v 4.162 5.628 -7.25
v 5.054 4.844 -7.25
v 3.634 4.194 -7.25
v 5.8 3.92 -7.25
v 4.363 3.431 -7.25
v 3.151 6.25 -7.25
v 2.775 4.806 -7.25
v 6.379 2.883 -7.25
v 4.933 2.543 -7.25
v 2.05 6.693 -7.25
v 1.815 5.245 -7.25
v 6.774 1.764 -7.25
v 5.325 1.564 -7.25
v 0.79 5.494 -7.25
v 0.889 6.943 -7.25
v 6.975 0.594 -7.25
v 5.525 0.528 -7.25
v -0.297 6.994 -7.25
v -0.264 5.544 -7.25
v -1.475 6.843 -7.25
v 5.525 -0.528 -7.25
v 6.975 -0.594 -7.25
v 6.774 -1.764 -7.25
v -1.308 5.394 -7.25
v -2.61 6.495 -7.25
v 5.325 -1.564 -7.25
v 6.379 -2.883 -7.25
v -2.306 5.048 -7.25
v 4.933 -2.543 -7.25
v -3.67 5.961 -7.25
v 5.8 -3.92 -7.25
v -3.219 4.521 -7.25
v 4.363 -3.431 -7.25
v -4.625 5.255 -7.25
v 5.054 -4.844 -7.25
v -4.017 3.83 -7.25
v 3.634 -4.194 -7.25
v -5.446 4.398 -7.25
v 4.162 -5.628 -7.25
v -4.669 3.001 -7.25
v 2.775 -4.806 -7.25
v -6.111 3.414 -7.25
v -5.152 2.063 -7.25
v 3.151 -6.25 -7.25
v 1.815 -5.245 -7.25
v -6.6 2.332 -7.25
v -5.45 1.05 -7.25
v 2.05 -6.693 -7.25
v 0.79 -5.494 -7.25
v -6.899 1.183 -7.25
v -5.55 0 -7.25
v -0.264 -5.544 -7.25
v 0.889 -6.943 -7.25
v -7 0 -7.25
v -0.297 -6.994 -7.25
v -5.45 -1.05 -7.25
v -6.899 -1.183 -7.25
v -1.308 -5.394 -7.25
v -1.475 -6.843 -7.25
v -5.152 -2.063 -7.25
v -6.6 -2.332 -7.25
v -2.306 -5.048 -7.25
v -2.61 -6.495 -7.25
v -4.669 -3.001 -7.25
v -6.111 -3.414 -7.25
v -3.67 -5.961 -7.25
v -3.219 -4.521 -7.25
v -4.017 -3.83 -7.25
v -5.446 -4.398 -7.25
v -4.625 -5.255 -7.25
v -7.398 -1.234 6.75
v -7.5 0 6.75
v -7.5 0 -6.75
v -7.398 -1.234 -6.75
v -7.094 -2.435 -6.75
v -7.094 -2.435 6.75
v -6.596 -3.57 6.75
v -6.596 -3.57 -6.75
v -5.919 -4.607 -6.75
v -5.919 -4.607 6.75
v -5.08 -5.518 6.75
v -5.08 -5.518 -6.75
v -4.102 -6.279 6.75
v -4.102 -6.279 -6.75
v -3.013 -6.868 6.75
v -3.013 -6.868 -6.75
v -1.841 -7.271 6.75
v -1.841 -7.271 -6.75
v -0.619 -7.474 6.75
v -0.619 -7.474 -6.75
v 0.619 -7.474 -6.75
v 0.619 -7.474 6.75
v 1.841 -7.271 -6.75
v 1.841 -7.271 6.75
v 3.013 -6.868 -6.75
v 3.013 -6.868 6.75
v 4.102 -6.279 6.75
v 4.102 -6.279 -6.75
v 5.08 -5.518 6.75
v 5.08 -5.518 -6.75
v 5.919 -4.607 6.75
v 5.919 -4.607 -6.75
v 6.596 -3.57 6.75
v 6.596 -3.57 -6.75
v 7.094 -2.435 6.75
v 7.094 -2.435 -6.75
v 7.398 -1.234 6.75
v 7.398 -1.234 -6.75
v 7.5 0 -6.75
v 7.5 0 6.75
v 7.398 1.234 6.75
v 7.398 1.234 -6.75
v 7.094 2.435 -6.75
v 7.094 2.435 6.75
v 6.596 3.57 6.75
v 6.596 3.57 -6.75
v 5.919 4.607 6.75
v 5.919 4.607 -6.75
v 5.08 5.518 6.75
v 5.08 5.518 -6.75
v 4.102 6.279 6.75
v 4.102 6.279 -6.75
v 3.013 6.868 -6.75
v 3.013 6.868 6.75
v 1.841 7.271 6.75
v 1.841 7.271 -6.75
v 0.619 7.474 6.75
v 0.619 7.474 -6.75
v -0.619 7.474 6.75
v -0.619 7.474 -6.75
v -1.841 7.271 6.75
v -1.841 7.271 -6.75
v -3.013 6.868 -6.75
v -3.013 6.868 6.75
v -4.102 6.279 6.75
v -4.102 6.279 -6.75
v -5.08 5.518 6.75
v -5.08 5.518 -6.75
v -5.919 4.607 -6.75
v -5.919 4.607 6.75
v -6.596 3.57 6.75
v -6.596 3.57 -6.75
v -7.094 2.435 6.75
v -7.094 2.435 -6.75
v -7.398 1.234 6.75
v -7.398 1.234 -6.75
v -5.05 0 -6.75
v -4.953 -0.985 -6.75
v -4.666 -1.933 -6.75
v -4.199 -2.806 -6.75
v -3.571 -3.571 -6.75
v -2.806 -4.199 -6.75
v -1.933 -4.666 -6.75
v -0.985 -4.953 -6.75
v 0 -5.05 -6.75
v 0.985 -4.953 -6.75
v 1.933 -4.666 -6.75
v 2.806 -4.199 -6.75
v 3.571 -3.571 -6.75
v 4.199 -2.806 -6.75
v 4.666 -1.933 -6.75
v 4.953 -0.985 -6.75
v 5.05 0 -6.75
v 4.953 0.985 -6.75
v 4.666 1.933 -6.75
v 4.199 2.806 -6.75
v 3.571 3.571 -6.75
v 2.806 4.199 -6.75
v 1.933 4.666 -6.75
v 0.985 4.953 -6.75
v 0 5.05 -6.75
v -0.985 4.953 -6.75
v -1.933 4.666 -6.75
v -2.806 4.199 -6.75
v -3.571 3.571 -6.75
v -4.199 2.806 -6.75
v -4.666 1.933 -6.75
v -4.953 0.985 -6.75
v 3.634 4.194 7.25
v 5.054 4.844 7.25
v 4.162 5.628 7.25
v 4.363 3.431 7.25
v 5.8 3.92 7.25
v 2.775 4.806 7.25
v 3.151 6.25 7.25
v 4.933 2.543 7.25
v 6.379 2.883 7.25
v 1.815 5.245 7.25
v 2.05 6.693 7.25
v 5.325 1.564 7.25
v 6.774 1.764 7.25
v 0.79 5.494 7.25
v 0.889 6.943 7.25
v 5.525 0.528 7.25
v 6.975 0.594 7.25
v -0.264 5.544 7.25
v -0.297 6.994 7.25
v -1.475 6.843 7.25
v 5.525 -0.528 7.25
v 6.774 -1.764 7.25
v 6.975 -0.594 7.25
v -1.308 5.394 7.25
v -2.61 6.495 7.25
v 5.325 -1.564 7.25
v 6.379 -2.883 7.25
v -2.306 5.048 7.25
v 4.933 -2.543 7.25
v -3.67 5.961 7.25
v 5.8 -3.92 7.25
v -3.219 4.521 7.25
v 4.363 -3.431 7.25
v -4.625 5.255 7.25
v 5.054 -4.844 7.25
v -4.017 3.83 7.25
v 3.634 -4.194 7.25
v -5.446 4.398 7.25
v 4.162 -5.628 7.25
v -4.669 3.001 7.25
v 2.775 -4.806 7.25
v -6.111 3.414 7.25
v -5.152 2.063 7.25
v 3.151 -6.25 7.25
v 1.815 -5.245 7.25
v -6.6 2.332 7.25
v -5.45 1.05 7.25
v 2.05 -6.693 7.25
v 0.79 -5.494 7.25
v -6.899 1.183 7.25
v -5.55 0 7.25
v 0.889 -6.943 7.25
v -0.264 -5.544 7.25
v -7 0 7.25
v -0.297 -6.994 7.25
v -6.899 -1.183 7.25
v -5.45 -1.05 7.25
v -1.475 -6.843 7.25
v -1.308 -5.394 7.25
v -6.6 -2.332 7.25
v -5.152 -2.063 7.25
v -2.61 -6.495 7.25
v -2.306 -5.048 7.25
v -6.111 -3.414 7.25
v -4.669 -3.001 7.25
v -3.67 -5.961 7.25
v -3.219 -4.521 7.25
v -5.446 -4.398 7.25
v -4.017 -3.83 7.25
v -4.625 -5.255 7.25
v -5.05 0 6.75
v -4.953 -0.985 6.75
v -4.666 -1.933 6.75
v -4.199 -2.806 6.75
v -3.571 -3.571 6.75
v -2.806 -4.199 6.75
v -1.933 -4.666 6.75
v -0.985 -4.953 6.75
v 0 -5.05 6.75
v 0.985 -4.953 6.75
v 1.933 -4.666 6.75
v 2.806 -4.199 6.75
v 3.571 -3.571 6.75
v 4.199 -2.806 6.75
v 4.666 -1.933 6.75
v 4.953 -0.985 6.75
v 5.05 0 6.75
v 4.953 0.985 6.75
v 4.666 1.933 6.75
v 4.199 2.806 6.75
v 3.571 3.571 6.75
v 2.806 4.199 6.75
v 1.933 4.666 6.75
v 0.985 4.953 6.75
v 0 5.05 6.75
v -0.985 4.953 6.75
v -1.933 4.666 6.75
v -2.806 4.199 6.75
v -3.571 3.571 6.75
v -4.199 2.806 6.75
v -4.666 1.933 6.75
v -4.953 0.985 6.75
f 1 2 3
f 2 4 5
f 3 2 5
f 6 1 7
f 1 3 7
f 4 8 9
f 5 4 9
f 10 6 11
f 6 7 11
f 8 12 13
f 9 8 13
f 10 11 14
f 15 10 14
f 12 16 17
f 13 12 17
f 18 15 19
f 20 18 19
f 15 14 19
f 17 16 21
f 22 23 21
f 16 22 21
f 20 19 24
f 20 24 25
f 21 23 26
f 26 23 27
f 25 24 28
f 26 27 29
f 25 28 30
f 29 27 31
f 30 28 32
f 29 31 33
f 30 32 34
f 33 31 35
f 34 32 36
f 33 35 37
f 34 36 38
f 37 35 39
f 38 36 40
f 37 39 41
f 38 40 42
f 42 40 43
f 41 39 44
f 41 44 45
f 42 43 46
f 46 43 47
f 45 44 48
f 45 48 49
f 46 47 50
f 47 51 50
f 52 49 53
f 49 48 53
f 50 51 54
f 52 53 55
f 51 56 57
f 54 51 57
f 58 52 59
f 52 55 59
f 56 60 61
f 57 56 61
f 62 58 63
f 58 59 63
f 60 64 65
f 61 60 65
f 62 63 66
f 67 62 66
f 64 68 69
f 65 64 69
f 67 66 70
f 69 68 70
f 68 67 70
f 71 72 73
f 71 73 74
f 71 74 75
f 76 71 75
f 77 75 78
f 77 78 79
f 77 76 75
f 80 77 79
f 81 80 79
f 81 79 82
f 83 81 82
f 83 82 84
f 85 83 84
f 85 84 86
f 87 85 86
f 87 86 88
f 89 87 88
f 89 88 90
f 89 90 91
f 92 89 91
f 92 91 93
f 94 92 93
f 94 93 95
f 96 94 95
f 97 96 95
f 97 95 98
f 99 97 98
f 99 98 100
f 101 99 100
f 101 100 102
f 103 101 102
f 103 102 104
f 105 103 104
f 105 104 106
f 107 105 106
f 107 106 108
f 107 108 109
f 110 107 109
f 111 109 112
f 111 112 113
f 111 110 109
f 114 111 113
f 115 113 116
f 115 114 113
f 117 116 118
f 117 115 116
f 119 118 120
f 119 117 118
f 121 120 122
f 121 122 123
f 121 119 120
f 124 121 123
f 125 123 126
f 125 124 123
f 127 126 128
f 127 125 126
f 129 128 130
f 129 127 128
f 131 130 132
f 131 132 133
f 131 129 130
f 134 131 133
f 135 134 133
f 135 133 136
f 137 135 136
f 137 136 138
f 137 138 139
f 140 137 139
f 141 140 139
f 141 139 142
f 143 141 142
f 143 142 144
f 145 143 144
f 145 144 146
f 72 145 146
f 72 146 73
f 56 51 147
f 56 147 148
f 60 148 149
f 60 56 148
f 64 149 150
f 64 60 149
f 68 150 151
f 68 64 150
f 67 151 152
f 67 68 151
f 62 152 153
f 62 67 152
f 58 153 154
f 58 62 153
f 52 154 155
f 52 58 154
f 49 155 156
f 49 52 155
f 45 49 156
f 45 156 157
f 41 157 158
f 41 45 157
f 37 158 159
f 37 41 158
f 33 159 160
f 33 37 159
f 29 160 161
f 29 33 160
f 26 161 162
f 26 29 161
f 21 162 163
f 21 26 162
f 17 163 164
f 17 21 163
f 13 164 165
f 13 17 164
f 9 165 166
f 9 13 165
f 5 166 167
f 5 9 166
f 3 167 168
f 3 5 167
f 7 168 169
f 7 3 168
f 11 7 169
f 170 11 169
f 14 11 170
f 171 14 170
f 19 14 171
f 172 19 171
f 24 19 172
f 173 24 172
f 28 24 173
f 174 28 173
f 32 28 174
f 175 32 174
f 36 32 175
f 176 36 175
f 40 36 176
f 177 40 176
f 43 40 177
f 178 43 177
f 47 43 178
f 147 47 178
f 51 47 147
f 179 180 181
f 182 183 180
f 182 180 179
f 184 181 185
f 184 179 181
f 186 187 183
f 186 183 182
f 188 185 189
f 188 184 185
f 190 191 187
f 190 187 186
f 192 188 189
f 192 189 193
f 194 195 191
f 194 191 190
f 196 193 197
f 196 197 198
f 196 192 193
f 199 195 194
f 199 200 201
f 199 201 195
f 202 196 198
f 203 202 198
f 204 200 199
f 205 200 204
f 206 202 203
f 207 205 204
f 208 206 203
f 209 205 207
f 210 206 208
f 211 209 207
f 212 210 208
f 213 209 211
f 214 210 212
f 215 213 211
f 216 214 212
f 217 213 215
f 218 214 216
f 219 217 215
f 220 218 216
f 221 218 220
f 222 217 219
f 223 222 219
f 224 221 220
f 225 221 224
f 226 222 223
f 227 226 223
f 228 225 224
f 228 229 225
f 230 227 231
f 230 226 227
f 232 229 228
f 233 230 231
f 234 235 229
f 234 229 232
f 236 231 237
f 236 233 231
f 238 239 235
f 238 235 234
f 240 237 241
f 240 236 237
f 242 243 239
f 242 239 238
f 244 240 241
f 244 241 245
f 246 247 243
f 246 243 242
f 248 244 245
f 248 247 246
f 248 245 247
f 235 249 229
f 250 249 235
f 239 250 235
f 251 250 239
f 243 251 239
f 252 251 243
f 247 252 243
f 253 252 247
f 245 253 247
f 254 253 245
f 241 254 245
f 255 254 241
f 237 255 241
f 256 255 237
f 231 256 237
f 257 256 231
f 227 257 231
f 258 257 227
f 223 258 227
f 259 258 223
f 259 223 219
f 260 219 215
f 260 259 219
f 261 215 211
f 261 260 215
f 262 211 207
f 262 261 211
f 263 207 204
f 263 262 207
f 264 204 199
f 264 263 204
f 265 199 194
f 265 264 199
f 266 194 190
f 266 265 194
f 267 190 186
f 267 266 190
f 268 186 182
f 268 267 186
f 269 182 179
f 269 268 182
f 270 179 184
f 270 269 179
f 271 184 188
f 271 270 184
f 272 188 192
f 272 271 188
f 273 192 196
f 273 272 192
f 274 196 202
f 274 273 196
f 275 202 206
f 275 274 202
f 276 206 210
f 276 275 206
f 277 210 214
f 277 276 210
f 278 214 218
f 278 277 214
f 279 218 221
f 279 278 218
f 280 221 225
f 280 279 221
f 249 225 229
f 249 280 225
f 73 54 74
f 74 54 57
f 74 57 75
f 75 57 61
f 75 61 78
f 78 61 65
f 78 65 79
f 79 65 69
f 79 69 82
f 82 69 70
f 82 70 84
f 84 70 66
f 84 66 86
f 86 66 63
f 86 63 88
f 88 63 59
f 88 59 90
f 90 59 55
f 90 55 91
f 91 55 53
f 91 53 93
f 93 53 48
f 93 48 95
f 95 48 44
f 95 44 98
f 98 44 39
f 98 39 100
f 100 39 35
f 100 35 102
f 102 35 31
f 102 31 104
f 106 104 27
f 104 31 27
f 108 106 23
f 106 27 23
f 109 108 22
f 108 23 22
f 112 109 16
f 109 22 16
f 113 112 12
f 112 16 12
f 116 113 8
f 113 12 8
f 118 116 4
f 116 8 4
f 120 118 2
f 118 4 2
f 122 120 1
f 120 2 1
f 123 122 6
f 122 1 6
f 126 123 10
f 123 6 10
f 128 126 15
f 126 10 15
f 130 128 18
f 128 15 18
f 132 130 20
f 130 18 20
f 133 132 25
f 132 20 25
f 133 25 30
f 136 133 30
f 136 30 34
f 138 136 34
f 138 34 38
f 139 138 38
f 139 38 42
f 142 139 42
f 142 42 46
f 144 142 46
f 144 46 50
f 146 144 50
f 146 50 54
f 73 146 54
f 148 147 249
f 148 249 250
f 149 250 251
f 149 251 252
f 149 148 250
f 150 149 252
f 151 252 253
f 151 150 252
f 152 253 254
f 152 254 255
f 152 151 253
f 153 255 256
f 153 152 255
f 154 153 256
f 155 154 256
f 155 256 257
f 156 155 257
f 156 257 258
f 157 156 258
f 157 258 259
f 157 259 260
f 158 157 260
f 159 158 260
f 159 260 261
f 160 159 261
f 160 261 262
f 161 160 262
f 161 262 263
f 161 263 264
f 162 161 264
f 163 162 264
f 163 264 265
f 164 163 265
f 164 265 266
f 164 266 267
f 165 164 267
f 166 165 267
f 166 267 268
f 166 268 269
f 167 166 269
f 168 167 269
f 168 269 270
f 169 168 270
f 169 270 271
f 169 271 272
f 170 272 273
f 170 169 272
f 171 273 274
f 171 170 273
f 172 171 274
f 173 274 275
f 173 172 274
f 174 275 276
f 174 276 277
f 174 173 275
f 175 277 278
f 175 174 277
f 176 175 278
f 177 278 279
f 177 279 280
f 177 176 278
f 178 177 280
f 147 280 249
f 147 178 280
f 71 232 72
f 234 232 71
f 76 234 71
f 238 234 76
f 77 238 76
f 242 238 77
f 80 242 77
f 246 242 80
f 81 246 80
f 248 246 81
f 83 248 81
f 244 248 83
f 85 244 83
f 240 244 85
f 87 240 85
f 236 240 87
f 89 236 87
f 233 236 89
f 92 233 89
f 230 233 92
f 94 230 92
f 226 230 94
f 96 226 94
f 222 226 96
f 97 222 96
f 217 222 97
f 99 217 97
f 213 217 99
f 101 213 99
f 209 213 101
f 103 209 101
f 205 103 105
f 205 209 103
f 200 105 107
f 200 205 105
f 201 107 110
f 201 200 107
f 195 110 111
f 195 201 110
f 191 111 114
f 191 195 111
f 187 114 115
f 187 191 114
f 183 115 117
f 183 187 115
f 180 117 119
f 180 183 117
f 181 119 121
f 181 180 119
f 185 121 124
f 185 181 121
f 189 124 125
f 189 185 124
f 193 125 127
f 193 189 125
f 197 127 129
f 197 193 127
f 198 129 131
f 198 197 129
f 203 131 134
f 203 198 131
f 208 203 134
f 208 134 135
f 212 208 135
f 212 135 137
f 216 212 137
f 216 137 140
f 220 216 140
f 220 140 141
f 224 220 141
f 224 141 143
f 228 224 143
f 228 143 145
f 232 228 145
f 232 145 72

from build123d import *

# Parameters (mm, degrees)
ESBO_O1_R                = 7.5
ESBO_O1_R_2              = 5.05
RESSALTO_EXTRUS_O1_DEPTH = 7.25
CHANFRO1_SIZE            = 0.5


with BuildPart() as part:
    # Esboço1 → Ressalto-extrusão1 (new, symmetric)
    with BuildSketch(Plane.XY):
        with Locations(Location((0, 0, 0), (0, 0, 180))):
            Circle(ESBO_O1_R)
        with Locations(Location((0, 0, 0), (0, 0, 180))):
            Circle(ESBO_O1_R_2, mode=Mode.SUBTRACT)
    extrude(amount=RESSALTO_EXTRUS_O1_DEPTH, both=True)

    # Chanfro1
    chanfro1_edges = [part.edges().sort_by_distance(p)[0] for p in [
        (7.5, 0, -7.25),
        (7.5, 0, 7.25),
        (5.05, 0, -7.25),
        (5.05, 0, 7.25),
    ]]
    chamfer(chanfro1_edges, length=CHANFRO1_SIZE)


solid = part.part
